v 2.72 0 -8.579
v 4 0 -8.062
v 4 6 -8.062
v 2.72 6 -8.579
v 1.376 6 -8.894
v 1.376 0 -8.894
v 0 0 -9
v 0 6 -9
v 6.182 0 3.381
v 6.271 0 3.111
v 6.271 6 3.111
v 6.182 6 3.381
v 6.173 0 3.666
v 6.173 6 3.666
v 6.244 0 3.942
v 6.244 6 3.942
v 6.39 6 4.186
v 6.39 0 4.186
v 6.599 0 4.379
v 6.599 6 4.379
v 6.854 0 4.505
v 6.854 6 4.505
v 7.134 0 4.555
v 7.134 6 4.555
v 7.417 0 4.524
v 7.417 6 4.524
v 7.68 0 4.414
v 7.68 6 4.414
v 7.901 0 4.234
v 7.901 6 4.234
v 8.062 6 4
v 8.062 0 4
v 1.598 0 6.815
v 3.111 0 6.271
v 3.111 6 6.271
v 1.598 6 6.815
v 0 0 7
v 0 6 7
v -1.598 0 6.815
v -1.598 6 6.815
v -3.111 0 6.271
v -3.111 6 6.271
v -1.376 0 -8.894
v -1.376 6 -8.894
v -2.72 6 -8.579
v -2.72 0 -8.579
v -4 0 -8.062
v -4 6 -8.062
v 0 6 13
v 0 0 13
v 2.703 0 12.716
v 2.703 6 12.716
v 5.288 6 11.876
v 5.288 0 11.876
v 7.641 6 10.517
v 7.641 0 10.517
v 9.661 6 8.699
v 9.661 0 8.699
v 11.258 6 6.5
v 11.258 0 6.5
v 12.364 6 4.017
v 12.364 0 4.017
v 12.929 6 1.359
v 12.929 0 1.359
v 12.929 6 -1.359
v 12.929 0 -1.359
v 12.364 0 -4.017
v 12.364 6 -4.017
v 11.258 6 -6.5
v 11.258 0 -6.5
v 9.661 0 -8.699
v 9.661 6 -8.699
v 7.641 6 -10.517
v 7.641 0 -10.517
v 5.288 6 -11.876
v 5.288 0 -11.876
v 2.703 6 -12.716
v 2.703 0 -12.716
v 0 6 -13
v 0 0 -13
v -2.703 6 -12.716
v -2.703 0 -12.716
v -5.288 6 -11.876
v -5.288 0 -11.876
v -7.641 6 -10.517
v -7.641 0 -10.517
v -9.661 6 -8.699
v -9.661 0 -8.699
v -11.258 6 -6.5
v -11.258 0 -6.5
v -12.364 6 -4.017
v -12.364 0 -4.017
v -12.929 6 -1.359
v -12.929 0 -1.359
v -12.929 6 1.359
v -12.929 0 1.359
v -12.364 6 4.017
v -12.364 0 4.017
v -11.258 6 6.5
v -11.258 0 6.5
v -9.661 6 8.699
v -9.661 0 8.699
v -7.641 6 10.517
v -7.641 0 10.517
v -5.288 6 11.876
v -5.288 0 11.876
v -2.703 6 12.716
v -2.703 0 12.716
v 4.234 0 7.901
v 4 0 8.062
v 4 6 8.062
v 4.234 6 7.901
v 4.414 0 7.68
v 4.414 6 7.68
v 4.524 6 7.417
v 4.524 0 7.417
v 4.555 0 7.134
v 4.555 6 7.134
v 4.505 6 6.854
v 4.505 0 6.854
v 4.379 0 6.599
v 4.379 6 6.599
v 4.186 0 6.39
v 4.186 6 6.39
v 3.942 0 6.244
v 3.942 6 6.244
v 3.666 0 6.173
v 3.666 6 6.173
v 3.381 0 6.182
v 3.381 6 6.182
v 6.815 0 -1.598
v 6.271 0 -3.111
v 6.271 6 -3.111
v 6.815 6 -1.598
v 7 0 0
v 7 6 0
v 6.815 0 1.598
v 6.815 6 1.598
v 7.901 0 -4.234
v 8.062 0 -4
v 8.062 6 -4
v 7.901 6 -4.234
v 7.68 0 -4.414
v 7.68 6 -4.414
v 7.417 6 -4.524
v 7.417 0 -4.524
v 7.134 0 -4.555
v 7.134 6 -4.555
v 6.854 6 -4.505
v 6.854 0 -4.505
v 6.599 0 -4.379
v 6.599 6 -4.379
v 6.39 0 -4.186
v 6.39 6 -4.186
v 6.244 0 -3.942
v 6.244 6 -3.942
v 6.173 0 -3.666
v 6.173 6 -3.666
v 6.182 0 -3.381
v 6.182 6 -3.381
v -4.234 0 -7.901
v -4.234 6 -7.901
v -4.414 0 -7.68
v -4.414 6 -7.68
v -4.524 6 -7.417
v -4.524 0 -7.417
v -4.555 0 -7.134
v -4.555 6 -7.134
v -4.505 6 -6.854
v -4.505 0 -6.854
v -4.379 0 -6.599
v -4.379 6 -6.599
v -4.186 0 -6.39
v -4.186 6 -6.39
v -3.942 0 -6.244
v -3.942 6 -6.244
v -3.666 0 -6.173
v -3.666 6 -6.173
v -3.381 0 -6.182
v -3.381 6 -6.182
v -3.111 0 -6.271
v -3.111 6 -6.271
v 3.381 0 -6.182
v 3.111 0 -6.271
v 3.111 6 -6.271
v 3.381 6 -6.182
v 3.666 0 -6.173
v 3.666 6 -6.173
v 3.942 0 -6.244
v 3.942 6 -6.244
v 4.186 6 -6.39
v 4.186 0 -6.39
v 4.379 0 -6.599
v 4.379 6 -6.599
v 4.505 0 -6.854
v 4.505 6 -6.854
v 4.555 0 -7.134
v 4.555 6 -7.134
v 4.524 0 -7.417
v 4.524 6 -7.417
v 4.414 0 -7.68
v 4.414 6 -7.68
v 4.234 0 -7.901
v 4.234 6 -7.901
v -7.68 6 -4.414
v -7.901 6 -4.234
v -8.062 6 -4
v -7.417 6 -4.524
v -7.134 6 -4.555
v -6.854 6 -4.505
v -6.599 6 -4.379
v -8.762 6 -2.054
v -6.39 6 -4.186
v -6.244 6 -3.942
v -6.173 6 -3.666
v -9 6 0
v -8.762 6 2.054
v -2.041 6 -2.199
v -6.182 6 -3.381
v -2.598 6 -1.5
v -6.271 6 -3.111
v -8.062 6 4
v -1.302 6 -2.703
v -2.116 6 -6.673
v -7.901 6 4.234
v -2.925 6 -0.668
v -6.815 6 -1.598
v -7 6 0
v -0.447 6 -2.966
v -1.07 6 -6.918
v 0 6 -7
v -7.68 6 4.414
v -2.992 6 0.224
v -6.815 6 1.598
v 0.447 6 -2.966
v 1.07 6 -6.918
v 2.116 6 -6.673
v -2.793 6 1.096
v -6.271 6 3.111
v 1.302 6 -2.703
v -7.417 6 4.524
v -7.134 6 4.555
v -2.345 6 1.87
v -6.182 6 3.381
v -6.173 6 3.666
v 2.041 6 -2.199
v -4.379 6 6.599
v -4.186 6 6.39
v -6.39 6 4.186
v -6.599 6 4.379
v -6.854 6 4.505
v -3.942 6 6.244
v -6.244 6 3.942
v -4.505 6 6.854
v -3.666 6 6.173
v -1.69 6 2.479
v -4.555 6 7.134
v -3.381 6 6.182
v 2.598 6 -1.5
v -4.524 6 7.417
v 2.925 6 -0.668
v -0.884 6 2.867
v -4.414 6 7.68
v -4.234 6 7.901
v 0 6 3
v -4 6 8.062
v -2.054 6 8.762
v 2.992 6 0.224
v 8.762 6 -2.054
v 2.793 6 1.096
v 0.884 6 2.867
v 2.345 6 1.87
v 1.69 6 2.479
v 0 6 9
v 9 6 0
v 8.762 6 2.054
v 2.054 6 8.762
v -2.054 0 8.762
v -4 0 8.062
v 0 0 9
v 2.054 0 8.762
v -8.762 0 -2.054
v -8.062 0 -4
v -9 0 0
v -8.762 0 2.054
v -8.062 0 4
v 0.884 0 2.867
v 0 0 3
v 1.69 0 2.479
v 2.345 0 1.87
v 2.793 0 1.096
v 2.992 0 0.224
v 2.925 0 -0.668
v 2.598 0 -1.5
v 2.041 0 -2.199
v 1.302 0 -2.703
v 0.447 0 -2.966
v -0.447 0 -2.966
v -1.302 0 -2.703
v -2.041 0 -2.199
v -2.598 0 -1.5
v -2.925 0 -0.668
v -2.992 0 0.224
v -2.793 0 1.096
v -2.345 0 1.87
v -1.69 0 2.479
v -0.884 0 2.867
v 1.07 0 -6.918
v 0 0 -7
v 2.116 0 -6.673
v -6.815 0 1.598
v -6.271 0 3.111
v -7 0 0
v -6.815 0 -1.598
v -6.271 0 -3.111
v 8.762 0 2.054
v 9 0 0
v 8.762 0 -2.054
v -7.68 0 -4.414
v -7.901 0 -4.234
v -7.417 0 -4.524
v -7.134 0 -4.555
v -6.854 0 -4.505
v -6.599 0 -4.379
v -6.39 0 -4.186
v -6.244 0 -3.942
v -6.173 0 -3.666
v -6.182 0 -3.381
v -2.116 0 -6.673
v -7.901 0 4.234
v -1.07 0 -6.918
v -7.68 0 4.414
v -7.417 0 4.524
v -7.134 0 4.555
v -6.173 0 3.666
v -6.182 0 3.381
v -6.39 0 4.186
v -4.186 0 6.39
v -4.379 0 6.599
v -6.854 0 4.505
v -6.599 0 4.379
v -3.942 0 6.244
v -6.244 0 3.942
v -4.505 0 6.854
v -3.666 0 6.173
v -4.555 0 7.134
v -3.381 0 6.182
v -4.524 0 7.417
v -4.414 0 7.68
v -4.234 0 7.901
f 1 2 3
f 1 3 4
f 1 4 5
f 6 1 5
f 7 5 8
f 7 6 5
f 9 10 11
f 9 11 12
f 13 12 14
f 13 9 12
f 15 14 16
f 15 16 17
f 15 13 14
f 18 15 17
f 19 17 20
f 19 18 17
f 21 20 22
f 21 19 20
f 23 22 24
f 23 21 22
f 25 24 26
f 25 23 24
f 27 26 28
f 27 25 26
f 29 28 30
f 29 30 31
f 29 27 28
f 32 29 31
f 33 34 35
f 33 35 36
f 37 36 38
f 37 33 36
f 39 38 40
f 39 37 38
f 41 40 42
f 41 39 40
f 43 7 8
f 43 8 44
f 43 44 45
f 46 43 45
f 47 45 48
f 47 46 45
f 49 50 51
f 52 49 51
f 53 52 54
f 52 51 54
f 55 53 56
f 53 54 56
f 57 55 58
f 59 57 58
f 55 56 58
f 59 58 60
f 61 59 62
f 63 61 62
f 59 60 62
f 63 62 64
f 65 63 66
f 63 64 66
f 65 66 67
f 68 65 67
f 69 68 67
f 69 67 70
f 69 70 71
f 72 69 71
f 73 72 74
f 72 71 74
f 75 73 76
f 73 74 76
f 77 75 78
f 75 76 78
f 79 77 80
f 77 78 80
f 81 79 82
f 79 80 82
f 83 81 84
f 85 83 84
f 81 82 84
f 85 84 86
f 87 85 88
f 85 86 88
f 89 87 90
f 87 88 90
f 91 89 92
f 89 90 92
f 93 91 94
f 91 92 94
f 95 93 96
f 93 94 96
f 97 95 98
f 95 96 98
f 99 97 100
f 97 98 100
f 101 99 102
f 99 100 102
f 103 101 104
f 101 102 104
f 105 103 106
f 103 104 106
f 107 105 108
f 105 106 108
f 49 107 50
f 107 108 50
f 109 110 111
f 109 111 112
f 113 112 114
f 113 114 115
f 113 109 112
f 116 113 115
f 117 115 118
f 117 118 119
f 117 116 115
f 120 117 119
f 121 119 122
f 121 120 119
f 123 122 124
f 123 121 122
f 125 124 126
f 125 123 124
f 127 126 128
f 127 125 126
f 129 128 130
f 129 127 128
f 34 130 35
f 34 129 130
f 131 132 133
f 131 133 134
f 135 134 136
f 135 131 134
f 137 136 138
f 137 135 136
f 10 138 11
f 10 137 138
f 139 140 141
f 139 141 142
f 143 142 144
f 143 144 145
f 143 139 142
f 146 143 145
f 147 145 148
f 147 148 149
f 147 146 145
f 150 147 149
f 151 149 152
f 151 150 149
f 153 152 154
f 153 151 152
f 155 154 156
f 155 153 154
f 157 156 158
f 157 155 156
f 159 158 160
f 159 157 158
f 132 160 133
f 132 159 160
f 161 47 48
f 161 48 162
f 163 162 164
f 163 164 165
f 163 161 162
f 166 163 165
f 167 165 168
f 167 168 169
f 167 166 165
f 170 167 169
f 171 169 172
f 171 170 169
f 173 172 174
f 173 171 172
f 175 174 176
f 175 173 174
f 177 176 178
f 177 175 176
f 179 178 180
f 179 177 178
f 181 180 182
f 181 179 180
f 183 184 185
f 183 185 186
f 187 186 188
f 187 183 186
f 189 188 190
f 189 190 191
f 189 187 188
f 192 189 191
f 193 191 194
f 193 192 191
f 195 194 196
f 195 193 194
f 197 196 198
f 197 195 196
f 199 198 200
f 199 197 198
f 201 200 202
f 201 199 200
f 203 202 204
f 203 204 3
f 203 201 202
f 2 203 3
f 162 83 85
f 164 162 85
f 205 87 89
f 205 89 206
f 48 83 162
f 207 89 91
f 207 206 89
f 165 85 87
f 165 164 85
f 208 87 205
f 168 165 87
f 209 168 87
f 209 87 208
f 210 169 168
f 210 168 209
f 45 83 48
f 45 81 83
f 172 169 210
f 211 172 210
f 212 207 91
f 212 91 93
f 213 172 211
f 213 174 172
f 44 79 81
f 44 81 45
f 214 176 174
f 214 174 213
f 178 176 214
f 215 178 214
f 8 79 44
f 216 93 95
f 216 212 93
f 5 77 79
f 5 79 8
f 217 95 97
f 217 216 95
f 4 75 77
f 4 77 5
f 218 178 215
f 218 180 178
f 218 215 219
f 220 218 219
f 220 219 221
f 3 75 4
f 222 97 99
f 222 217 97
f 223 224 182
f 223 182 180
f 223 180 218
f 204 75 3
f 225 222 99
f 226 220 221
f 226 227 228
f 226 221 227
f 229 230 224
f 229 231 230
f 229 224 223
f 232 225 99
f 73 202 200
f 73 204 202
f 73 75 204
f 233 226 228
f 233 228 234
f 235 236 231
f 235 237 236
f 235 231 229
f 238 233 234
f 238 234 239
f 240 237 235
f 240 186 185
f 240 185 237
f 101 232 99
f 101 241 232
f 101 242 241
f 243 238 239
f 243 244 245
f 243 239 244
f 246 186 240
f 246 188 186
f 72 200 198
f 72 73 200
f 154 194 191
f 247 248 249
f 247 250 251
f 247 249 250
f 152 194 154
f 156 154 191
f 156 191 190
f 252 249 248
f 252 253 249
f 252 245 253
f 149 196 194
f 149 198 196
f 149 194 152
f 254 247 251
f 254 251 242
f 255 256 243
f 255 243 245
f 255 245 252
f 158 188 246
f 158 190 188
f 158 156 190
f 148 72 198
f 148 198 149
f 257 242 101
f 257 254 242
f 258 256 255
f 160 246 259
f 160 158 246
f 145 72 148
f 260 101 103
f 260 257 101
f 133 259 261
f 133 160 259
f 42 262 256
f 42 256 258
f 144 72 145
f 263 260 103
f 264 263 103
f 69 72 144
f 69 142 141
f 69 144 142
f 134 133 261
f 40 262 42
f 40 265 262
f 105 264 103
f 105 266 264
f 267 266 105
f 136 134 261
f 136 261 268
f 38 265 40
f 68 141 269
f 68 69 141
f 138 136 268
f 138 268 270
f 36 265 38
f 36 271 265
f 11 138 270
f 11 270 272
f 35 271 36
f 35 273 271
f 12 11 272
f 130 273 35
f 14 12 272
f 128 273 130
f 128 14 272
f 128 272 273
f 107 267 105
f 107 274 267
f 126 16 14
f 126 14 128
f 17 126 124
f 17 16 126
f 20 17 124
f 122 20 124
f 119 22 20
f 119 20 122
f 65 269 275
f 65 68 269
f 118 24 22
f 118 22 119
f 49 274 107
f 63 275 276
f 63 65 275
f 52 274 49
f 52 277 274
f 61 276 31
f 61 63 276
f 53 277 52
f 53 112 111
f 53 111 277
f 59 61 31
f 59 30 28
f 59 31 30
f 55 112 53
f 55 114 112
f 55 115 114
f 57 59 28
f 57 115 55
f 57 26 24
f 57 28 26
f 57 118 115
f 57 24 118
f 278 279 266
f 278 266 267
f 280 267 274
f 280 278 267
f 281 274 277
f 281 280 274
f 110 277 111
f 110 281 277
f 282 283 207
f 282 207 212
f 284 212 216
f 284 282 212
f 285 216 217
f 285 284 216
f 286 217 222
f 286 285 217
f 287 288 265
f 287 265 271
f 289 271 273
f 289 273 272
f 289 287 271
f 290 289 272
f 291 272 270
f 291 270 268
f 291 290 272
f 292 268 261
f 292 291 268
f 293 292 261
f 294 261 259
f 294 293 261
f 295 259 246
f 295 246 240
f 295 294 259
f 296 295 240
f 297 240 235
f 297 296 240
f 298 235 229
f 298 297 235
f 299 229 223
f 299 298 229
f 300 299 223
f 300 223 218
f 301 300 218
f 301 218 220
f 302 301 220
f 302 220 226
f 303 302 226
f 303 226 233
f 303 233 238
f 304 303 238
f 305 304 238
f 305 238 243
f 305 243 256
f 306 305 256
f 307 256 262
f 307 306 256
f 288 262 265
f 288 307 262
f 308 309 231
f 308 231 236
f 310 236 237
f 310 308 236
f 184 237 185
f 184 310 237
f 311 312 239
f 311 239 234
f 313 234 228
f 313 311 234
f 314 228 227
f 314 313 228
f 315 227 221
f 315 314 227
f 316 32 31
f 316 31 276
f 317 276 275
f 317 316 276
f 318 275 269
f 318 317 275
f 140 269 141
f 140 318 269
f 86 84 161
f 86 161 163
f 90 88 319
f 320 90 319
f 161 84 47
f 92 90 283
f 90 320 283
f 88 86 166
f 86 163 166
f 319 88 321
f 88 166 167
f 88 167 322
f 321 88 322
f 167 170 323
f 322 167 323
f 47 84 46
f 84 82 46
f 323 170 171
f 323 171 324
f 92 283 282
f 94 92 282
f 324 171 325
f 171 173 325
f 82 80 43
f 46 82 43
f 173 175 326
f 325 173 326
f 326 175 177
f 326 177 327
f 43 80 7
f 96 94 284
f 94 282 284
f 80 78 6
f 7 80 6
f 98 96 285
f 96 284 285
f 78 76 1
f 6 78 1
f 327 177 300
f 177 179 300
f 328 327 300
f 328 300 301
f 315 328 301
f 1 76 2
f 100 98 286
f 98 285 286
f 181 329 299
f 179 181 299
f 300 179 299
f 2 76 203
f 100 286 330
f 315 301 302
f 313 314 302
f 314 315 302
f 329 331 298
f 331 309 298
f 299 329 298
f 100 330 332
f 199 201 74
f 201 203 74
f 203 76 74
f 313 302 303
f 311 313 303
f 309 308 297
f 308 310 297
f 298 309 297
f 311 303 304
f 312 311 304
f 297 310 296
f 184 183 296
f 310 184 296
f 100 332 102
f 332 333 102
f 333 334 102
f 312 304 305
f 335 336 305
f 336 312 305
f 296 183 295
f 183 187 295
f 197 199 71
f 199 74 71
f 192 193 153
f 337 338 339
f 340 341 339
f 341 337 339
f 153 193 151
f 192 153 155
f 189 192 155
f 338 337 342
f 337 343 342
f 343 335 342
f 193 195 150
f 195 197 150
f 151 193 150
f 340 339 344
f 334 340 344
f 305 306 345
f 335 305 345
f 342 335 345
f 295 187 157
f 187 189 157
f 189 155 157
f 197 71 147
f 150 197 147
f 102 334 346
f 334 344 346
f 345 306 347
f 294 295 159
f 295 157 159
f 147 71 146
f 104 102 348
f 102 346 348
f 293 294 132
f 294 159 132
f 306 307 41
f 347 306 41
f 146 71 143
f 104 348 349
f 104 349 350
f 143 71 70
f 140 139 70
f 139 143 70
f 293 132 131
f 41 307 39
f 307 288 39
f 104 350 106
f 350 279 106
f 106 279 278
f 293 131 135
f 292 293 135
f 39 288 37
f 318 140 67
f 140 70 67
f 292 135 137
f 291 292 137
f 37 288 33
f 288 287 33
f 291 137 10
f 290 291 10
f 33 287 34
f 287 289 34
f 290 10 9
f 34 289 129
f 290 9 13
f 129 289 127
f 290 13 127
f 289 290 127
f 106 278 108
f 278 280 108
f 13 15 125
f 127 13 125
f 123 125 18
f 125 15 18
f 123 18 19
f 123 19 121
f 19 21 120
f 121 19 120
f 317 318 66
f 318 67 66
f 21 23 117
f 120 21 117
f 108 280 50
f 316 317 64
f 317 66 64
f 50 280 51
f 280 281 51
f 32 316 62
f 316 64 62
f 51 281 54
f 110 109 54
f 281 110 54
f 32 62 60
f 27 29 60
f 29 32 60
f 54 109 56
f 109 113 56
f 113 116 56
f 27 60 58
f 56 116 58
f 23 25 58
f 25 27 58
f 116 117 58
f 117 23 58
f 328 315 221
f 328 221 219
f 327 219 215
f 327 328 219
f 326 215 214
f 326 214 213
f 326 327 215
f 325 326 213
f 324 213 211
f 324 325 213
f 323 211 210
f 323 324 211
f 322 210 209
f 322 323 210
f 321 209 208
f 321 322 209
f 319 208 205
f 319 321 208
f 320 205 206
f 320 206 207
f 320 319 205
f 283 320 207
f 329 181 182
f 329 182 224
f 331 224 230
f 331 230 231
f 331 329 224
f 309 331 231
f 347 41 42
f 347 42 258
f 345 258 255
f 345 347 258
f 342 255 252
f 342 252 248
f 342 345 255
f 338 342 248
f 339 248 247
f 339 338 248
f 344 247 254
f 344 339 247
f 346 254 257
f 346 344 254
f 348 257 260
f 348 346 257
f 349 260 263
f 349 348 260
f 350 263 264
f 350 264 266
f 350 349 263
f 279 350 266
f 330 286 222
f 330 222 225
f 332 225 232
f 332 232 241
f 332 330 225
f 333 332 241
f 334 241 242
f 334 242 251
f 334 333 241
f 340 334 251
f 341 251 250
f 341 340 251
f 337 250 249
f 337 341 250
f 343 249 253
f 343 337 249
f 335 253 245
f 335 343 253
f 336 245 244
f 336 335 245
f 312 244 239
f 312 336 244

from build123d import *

# Parameters (mm, degrees)
SKETCH1_R           = 13
SKETCH1_R_2         = 3
BOSS_EXTRUDE1_DEPTH = 6
CIRPATTERN1_DEPTH   = 6


# Read off the part's stored shape, not the designer's step: CirPattern1
with BuildPart() as part:
    # Sketch1 → Boss-Extrude1 (new body)
    with BuildSketch(Plane(origin=(0, 0, 0), x_dir=(1, 0, 0), z_dir=(0, 1, 0))):
        with Locations(Location((0, 0, 0), (0, 0, 270))):
            Circle(SKETCH1_R)
        with Locations(Location((0, 0, 0), (0, 0, 270))):
            Circle(SKETCH1_R_2, mode=Mode.SUBTRACT)
        with BuildLine():
            ThreePointArc((-3.111111111, 6.270644915), (-1.597730514, 6.815222462), (0, 7))
            ThreePointArc((0, 7), (1.597730514, 6.815222462), (3.111111111, 6.270644915))
            ThreePointArc((3.111111111, 6.270644915), (4.451361972, 6.722006887), (4, 8.062257748))
            ThreePointArc((4, 8.062257748), (2.054224947, 8.762428879), (0, 9))
            ThreePointArc((0, 9), (-2.054224947, 8.762428879), (-4, 8.062257748))
            ThreePointArc((-4, 8.062257748), (-4.451361972, 6.722006887), (-3.111111111, 6.270644915))
        make_face(mode=Mode.SUBTRACT)
    extrude(amount=BOSS_EXTRUDE1_DEPTH)

    # CirPattern1 outline → CirPattern1 (cut)
    with BuildSketch(Plane(origin=(0, 0, 0), x_dir=(1, 0, 0), z_dir=(0, 1, 0))):
        with BuildLine():
            ThreePointArc((8.062257748, 4), (6.722006887, 4.451361972), (6.270644915, 3.111111111))
            ThreePointArc((6.270644915, 3.111111111), (7, 0), (6.270644915, -3.111111111))
            ThreePointArc((6.270644915, -3.111111111), (6.722006887, -4.451361972), (8.062257748, -4))
            ThreePointArc((8.062257748, -4), (9, 0), (8.062257748, 4))
        make_face()
        with BuildLine():
            ThreePointArc((4, -8.062257748), (4.451361972, -6.722006887), (3.111111111, -6.270644915))
            ThreePointArc((3.111111111, -6.270644915), (0, -7), (-3.111111111, -6.270644915))
            ThreePointArc((-3.111111111, -6.270644915), (-4.451361972, -6.722006887), (-4, -8.062257748))
            ThreePointArc((-4, -8.062257748), (0, -9), (4, -8.062257748))
        make_face()
        with BuildLine():
            ThreePointArc((-8.062257748, -4), (-6.722006887, -4.451361972), (-6.270644915, -3.111111111))
            ThreePointArc((-6.270644915, -3.111111111), (-7, 0), (-6.270644915, 3.111111111))
            ThreePointArc((-6.270644915, 3.111111111), (-6.722006887, 4.451361972), (-8.062257748, 4))
            ThreePointArc((-8.062257748, 4), (-9, 0), (-8.062257748, -4))
        make_face()
    extrude(amount=CIRPATTERN1_DEPTH, mode=Mode.SUBTRACT)


solid = part.part
